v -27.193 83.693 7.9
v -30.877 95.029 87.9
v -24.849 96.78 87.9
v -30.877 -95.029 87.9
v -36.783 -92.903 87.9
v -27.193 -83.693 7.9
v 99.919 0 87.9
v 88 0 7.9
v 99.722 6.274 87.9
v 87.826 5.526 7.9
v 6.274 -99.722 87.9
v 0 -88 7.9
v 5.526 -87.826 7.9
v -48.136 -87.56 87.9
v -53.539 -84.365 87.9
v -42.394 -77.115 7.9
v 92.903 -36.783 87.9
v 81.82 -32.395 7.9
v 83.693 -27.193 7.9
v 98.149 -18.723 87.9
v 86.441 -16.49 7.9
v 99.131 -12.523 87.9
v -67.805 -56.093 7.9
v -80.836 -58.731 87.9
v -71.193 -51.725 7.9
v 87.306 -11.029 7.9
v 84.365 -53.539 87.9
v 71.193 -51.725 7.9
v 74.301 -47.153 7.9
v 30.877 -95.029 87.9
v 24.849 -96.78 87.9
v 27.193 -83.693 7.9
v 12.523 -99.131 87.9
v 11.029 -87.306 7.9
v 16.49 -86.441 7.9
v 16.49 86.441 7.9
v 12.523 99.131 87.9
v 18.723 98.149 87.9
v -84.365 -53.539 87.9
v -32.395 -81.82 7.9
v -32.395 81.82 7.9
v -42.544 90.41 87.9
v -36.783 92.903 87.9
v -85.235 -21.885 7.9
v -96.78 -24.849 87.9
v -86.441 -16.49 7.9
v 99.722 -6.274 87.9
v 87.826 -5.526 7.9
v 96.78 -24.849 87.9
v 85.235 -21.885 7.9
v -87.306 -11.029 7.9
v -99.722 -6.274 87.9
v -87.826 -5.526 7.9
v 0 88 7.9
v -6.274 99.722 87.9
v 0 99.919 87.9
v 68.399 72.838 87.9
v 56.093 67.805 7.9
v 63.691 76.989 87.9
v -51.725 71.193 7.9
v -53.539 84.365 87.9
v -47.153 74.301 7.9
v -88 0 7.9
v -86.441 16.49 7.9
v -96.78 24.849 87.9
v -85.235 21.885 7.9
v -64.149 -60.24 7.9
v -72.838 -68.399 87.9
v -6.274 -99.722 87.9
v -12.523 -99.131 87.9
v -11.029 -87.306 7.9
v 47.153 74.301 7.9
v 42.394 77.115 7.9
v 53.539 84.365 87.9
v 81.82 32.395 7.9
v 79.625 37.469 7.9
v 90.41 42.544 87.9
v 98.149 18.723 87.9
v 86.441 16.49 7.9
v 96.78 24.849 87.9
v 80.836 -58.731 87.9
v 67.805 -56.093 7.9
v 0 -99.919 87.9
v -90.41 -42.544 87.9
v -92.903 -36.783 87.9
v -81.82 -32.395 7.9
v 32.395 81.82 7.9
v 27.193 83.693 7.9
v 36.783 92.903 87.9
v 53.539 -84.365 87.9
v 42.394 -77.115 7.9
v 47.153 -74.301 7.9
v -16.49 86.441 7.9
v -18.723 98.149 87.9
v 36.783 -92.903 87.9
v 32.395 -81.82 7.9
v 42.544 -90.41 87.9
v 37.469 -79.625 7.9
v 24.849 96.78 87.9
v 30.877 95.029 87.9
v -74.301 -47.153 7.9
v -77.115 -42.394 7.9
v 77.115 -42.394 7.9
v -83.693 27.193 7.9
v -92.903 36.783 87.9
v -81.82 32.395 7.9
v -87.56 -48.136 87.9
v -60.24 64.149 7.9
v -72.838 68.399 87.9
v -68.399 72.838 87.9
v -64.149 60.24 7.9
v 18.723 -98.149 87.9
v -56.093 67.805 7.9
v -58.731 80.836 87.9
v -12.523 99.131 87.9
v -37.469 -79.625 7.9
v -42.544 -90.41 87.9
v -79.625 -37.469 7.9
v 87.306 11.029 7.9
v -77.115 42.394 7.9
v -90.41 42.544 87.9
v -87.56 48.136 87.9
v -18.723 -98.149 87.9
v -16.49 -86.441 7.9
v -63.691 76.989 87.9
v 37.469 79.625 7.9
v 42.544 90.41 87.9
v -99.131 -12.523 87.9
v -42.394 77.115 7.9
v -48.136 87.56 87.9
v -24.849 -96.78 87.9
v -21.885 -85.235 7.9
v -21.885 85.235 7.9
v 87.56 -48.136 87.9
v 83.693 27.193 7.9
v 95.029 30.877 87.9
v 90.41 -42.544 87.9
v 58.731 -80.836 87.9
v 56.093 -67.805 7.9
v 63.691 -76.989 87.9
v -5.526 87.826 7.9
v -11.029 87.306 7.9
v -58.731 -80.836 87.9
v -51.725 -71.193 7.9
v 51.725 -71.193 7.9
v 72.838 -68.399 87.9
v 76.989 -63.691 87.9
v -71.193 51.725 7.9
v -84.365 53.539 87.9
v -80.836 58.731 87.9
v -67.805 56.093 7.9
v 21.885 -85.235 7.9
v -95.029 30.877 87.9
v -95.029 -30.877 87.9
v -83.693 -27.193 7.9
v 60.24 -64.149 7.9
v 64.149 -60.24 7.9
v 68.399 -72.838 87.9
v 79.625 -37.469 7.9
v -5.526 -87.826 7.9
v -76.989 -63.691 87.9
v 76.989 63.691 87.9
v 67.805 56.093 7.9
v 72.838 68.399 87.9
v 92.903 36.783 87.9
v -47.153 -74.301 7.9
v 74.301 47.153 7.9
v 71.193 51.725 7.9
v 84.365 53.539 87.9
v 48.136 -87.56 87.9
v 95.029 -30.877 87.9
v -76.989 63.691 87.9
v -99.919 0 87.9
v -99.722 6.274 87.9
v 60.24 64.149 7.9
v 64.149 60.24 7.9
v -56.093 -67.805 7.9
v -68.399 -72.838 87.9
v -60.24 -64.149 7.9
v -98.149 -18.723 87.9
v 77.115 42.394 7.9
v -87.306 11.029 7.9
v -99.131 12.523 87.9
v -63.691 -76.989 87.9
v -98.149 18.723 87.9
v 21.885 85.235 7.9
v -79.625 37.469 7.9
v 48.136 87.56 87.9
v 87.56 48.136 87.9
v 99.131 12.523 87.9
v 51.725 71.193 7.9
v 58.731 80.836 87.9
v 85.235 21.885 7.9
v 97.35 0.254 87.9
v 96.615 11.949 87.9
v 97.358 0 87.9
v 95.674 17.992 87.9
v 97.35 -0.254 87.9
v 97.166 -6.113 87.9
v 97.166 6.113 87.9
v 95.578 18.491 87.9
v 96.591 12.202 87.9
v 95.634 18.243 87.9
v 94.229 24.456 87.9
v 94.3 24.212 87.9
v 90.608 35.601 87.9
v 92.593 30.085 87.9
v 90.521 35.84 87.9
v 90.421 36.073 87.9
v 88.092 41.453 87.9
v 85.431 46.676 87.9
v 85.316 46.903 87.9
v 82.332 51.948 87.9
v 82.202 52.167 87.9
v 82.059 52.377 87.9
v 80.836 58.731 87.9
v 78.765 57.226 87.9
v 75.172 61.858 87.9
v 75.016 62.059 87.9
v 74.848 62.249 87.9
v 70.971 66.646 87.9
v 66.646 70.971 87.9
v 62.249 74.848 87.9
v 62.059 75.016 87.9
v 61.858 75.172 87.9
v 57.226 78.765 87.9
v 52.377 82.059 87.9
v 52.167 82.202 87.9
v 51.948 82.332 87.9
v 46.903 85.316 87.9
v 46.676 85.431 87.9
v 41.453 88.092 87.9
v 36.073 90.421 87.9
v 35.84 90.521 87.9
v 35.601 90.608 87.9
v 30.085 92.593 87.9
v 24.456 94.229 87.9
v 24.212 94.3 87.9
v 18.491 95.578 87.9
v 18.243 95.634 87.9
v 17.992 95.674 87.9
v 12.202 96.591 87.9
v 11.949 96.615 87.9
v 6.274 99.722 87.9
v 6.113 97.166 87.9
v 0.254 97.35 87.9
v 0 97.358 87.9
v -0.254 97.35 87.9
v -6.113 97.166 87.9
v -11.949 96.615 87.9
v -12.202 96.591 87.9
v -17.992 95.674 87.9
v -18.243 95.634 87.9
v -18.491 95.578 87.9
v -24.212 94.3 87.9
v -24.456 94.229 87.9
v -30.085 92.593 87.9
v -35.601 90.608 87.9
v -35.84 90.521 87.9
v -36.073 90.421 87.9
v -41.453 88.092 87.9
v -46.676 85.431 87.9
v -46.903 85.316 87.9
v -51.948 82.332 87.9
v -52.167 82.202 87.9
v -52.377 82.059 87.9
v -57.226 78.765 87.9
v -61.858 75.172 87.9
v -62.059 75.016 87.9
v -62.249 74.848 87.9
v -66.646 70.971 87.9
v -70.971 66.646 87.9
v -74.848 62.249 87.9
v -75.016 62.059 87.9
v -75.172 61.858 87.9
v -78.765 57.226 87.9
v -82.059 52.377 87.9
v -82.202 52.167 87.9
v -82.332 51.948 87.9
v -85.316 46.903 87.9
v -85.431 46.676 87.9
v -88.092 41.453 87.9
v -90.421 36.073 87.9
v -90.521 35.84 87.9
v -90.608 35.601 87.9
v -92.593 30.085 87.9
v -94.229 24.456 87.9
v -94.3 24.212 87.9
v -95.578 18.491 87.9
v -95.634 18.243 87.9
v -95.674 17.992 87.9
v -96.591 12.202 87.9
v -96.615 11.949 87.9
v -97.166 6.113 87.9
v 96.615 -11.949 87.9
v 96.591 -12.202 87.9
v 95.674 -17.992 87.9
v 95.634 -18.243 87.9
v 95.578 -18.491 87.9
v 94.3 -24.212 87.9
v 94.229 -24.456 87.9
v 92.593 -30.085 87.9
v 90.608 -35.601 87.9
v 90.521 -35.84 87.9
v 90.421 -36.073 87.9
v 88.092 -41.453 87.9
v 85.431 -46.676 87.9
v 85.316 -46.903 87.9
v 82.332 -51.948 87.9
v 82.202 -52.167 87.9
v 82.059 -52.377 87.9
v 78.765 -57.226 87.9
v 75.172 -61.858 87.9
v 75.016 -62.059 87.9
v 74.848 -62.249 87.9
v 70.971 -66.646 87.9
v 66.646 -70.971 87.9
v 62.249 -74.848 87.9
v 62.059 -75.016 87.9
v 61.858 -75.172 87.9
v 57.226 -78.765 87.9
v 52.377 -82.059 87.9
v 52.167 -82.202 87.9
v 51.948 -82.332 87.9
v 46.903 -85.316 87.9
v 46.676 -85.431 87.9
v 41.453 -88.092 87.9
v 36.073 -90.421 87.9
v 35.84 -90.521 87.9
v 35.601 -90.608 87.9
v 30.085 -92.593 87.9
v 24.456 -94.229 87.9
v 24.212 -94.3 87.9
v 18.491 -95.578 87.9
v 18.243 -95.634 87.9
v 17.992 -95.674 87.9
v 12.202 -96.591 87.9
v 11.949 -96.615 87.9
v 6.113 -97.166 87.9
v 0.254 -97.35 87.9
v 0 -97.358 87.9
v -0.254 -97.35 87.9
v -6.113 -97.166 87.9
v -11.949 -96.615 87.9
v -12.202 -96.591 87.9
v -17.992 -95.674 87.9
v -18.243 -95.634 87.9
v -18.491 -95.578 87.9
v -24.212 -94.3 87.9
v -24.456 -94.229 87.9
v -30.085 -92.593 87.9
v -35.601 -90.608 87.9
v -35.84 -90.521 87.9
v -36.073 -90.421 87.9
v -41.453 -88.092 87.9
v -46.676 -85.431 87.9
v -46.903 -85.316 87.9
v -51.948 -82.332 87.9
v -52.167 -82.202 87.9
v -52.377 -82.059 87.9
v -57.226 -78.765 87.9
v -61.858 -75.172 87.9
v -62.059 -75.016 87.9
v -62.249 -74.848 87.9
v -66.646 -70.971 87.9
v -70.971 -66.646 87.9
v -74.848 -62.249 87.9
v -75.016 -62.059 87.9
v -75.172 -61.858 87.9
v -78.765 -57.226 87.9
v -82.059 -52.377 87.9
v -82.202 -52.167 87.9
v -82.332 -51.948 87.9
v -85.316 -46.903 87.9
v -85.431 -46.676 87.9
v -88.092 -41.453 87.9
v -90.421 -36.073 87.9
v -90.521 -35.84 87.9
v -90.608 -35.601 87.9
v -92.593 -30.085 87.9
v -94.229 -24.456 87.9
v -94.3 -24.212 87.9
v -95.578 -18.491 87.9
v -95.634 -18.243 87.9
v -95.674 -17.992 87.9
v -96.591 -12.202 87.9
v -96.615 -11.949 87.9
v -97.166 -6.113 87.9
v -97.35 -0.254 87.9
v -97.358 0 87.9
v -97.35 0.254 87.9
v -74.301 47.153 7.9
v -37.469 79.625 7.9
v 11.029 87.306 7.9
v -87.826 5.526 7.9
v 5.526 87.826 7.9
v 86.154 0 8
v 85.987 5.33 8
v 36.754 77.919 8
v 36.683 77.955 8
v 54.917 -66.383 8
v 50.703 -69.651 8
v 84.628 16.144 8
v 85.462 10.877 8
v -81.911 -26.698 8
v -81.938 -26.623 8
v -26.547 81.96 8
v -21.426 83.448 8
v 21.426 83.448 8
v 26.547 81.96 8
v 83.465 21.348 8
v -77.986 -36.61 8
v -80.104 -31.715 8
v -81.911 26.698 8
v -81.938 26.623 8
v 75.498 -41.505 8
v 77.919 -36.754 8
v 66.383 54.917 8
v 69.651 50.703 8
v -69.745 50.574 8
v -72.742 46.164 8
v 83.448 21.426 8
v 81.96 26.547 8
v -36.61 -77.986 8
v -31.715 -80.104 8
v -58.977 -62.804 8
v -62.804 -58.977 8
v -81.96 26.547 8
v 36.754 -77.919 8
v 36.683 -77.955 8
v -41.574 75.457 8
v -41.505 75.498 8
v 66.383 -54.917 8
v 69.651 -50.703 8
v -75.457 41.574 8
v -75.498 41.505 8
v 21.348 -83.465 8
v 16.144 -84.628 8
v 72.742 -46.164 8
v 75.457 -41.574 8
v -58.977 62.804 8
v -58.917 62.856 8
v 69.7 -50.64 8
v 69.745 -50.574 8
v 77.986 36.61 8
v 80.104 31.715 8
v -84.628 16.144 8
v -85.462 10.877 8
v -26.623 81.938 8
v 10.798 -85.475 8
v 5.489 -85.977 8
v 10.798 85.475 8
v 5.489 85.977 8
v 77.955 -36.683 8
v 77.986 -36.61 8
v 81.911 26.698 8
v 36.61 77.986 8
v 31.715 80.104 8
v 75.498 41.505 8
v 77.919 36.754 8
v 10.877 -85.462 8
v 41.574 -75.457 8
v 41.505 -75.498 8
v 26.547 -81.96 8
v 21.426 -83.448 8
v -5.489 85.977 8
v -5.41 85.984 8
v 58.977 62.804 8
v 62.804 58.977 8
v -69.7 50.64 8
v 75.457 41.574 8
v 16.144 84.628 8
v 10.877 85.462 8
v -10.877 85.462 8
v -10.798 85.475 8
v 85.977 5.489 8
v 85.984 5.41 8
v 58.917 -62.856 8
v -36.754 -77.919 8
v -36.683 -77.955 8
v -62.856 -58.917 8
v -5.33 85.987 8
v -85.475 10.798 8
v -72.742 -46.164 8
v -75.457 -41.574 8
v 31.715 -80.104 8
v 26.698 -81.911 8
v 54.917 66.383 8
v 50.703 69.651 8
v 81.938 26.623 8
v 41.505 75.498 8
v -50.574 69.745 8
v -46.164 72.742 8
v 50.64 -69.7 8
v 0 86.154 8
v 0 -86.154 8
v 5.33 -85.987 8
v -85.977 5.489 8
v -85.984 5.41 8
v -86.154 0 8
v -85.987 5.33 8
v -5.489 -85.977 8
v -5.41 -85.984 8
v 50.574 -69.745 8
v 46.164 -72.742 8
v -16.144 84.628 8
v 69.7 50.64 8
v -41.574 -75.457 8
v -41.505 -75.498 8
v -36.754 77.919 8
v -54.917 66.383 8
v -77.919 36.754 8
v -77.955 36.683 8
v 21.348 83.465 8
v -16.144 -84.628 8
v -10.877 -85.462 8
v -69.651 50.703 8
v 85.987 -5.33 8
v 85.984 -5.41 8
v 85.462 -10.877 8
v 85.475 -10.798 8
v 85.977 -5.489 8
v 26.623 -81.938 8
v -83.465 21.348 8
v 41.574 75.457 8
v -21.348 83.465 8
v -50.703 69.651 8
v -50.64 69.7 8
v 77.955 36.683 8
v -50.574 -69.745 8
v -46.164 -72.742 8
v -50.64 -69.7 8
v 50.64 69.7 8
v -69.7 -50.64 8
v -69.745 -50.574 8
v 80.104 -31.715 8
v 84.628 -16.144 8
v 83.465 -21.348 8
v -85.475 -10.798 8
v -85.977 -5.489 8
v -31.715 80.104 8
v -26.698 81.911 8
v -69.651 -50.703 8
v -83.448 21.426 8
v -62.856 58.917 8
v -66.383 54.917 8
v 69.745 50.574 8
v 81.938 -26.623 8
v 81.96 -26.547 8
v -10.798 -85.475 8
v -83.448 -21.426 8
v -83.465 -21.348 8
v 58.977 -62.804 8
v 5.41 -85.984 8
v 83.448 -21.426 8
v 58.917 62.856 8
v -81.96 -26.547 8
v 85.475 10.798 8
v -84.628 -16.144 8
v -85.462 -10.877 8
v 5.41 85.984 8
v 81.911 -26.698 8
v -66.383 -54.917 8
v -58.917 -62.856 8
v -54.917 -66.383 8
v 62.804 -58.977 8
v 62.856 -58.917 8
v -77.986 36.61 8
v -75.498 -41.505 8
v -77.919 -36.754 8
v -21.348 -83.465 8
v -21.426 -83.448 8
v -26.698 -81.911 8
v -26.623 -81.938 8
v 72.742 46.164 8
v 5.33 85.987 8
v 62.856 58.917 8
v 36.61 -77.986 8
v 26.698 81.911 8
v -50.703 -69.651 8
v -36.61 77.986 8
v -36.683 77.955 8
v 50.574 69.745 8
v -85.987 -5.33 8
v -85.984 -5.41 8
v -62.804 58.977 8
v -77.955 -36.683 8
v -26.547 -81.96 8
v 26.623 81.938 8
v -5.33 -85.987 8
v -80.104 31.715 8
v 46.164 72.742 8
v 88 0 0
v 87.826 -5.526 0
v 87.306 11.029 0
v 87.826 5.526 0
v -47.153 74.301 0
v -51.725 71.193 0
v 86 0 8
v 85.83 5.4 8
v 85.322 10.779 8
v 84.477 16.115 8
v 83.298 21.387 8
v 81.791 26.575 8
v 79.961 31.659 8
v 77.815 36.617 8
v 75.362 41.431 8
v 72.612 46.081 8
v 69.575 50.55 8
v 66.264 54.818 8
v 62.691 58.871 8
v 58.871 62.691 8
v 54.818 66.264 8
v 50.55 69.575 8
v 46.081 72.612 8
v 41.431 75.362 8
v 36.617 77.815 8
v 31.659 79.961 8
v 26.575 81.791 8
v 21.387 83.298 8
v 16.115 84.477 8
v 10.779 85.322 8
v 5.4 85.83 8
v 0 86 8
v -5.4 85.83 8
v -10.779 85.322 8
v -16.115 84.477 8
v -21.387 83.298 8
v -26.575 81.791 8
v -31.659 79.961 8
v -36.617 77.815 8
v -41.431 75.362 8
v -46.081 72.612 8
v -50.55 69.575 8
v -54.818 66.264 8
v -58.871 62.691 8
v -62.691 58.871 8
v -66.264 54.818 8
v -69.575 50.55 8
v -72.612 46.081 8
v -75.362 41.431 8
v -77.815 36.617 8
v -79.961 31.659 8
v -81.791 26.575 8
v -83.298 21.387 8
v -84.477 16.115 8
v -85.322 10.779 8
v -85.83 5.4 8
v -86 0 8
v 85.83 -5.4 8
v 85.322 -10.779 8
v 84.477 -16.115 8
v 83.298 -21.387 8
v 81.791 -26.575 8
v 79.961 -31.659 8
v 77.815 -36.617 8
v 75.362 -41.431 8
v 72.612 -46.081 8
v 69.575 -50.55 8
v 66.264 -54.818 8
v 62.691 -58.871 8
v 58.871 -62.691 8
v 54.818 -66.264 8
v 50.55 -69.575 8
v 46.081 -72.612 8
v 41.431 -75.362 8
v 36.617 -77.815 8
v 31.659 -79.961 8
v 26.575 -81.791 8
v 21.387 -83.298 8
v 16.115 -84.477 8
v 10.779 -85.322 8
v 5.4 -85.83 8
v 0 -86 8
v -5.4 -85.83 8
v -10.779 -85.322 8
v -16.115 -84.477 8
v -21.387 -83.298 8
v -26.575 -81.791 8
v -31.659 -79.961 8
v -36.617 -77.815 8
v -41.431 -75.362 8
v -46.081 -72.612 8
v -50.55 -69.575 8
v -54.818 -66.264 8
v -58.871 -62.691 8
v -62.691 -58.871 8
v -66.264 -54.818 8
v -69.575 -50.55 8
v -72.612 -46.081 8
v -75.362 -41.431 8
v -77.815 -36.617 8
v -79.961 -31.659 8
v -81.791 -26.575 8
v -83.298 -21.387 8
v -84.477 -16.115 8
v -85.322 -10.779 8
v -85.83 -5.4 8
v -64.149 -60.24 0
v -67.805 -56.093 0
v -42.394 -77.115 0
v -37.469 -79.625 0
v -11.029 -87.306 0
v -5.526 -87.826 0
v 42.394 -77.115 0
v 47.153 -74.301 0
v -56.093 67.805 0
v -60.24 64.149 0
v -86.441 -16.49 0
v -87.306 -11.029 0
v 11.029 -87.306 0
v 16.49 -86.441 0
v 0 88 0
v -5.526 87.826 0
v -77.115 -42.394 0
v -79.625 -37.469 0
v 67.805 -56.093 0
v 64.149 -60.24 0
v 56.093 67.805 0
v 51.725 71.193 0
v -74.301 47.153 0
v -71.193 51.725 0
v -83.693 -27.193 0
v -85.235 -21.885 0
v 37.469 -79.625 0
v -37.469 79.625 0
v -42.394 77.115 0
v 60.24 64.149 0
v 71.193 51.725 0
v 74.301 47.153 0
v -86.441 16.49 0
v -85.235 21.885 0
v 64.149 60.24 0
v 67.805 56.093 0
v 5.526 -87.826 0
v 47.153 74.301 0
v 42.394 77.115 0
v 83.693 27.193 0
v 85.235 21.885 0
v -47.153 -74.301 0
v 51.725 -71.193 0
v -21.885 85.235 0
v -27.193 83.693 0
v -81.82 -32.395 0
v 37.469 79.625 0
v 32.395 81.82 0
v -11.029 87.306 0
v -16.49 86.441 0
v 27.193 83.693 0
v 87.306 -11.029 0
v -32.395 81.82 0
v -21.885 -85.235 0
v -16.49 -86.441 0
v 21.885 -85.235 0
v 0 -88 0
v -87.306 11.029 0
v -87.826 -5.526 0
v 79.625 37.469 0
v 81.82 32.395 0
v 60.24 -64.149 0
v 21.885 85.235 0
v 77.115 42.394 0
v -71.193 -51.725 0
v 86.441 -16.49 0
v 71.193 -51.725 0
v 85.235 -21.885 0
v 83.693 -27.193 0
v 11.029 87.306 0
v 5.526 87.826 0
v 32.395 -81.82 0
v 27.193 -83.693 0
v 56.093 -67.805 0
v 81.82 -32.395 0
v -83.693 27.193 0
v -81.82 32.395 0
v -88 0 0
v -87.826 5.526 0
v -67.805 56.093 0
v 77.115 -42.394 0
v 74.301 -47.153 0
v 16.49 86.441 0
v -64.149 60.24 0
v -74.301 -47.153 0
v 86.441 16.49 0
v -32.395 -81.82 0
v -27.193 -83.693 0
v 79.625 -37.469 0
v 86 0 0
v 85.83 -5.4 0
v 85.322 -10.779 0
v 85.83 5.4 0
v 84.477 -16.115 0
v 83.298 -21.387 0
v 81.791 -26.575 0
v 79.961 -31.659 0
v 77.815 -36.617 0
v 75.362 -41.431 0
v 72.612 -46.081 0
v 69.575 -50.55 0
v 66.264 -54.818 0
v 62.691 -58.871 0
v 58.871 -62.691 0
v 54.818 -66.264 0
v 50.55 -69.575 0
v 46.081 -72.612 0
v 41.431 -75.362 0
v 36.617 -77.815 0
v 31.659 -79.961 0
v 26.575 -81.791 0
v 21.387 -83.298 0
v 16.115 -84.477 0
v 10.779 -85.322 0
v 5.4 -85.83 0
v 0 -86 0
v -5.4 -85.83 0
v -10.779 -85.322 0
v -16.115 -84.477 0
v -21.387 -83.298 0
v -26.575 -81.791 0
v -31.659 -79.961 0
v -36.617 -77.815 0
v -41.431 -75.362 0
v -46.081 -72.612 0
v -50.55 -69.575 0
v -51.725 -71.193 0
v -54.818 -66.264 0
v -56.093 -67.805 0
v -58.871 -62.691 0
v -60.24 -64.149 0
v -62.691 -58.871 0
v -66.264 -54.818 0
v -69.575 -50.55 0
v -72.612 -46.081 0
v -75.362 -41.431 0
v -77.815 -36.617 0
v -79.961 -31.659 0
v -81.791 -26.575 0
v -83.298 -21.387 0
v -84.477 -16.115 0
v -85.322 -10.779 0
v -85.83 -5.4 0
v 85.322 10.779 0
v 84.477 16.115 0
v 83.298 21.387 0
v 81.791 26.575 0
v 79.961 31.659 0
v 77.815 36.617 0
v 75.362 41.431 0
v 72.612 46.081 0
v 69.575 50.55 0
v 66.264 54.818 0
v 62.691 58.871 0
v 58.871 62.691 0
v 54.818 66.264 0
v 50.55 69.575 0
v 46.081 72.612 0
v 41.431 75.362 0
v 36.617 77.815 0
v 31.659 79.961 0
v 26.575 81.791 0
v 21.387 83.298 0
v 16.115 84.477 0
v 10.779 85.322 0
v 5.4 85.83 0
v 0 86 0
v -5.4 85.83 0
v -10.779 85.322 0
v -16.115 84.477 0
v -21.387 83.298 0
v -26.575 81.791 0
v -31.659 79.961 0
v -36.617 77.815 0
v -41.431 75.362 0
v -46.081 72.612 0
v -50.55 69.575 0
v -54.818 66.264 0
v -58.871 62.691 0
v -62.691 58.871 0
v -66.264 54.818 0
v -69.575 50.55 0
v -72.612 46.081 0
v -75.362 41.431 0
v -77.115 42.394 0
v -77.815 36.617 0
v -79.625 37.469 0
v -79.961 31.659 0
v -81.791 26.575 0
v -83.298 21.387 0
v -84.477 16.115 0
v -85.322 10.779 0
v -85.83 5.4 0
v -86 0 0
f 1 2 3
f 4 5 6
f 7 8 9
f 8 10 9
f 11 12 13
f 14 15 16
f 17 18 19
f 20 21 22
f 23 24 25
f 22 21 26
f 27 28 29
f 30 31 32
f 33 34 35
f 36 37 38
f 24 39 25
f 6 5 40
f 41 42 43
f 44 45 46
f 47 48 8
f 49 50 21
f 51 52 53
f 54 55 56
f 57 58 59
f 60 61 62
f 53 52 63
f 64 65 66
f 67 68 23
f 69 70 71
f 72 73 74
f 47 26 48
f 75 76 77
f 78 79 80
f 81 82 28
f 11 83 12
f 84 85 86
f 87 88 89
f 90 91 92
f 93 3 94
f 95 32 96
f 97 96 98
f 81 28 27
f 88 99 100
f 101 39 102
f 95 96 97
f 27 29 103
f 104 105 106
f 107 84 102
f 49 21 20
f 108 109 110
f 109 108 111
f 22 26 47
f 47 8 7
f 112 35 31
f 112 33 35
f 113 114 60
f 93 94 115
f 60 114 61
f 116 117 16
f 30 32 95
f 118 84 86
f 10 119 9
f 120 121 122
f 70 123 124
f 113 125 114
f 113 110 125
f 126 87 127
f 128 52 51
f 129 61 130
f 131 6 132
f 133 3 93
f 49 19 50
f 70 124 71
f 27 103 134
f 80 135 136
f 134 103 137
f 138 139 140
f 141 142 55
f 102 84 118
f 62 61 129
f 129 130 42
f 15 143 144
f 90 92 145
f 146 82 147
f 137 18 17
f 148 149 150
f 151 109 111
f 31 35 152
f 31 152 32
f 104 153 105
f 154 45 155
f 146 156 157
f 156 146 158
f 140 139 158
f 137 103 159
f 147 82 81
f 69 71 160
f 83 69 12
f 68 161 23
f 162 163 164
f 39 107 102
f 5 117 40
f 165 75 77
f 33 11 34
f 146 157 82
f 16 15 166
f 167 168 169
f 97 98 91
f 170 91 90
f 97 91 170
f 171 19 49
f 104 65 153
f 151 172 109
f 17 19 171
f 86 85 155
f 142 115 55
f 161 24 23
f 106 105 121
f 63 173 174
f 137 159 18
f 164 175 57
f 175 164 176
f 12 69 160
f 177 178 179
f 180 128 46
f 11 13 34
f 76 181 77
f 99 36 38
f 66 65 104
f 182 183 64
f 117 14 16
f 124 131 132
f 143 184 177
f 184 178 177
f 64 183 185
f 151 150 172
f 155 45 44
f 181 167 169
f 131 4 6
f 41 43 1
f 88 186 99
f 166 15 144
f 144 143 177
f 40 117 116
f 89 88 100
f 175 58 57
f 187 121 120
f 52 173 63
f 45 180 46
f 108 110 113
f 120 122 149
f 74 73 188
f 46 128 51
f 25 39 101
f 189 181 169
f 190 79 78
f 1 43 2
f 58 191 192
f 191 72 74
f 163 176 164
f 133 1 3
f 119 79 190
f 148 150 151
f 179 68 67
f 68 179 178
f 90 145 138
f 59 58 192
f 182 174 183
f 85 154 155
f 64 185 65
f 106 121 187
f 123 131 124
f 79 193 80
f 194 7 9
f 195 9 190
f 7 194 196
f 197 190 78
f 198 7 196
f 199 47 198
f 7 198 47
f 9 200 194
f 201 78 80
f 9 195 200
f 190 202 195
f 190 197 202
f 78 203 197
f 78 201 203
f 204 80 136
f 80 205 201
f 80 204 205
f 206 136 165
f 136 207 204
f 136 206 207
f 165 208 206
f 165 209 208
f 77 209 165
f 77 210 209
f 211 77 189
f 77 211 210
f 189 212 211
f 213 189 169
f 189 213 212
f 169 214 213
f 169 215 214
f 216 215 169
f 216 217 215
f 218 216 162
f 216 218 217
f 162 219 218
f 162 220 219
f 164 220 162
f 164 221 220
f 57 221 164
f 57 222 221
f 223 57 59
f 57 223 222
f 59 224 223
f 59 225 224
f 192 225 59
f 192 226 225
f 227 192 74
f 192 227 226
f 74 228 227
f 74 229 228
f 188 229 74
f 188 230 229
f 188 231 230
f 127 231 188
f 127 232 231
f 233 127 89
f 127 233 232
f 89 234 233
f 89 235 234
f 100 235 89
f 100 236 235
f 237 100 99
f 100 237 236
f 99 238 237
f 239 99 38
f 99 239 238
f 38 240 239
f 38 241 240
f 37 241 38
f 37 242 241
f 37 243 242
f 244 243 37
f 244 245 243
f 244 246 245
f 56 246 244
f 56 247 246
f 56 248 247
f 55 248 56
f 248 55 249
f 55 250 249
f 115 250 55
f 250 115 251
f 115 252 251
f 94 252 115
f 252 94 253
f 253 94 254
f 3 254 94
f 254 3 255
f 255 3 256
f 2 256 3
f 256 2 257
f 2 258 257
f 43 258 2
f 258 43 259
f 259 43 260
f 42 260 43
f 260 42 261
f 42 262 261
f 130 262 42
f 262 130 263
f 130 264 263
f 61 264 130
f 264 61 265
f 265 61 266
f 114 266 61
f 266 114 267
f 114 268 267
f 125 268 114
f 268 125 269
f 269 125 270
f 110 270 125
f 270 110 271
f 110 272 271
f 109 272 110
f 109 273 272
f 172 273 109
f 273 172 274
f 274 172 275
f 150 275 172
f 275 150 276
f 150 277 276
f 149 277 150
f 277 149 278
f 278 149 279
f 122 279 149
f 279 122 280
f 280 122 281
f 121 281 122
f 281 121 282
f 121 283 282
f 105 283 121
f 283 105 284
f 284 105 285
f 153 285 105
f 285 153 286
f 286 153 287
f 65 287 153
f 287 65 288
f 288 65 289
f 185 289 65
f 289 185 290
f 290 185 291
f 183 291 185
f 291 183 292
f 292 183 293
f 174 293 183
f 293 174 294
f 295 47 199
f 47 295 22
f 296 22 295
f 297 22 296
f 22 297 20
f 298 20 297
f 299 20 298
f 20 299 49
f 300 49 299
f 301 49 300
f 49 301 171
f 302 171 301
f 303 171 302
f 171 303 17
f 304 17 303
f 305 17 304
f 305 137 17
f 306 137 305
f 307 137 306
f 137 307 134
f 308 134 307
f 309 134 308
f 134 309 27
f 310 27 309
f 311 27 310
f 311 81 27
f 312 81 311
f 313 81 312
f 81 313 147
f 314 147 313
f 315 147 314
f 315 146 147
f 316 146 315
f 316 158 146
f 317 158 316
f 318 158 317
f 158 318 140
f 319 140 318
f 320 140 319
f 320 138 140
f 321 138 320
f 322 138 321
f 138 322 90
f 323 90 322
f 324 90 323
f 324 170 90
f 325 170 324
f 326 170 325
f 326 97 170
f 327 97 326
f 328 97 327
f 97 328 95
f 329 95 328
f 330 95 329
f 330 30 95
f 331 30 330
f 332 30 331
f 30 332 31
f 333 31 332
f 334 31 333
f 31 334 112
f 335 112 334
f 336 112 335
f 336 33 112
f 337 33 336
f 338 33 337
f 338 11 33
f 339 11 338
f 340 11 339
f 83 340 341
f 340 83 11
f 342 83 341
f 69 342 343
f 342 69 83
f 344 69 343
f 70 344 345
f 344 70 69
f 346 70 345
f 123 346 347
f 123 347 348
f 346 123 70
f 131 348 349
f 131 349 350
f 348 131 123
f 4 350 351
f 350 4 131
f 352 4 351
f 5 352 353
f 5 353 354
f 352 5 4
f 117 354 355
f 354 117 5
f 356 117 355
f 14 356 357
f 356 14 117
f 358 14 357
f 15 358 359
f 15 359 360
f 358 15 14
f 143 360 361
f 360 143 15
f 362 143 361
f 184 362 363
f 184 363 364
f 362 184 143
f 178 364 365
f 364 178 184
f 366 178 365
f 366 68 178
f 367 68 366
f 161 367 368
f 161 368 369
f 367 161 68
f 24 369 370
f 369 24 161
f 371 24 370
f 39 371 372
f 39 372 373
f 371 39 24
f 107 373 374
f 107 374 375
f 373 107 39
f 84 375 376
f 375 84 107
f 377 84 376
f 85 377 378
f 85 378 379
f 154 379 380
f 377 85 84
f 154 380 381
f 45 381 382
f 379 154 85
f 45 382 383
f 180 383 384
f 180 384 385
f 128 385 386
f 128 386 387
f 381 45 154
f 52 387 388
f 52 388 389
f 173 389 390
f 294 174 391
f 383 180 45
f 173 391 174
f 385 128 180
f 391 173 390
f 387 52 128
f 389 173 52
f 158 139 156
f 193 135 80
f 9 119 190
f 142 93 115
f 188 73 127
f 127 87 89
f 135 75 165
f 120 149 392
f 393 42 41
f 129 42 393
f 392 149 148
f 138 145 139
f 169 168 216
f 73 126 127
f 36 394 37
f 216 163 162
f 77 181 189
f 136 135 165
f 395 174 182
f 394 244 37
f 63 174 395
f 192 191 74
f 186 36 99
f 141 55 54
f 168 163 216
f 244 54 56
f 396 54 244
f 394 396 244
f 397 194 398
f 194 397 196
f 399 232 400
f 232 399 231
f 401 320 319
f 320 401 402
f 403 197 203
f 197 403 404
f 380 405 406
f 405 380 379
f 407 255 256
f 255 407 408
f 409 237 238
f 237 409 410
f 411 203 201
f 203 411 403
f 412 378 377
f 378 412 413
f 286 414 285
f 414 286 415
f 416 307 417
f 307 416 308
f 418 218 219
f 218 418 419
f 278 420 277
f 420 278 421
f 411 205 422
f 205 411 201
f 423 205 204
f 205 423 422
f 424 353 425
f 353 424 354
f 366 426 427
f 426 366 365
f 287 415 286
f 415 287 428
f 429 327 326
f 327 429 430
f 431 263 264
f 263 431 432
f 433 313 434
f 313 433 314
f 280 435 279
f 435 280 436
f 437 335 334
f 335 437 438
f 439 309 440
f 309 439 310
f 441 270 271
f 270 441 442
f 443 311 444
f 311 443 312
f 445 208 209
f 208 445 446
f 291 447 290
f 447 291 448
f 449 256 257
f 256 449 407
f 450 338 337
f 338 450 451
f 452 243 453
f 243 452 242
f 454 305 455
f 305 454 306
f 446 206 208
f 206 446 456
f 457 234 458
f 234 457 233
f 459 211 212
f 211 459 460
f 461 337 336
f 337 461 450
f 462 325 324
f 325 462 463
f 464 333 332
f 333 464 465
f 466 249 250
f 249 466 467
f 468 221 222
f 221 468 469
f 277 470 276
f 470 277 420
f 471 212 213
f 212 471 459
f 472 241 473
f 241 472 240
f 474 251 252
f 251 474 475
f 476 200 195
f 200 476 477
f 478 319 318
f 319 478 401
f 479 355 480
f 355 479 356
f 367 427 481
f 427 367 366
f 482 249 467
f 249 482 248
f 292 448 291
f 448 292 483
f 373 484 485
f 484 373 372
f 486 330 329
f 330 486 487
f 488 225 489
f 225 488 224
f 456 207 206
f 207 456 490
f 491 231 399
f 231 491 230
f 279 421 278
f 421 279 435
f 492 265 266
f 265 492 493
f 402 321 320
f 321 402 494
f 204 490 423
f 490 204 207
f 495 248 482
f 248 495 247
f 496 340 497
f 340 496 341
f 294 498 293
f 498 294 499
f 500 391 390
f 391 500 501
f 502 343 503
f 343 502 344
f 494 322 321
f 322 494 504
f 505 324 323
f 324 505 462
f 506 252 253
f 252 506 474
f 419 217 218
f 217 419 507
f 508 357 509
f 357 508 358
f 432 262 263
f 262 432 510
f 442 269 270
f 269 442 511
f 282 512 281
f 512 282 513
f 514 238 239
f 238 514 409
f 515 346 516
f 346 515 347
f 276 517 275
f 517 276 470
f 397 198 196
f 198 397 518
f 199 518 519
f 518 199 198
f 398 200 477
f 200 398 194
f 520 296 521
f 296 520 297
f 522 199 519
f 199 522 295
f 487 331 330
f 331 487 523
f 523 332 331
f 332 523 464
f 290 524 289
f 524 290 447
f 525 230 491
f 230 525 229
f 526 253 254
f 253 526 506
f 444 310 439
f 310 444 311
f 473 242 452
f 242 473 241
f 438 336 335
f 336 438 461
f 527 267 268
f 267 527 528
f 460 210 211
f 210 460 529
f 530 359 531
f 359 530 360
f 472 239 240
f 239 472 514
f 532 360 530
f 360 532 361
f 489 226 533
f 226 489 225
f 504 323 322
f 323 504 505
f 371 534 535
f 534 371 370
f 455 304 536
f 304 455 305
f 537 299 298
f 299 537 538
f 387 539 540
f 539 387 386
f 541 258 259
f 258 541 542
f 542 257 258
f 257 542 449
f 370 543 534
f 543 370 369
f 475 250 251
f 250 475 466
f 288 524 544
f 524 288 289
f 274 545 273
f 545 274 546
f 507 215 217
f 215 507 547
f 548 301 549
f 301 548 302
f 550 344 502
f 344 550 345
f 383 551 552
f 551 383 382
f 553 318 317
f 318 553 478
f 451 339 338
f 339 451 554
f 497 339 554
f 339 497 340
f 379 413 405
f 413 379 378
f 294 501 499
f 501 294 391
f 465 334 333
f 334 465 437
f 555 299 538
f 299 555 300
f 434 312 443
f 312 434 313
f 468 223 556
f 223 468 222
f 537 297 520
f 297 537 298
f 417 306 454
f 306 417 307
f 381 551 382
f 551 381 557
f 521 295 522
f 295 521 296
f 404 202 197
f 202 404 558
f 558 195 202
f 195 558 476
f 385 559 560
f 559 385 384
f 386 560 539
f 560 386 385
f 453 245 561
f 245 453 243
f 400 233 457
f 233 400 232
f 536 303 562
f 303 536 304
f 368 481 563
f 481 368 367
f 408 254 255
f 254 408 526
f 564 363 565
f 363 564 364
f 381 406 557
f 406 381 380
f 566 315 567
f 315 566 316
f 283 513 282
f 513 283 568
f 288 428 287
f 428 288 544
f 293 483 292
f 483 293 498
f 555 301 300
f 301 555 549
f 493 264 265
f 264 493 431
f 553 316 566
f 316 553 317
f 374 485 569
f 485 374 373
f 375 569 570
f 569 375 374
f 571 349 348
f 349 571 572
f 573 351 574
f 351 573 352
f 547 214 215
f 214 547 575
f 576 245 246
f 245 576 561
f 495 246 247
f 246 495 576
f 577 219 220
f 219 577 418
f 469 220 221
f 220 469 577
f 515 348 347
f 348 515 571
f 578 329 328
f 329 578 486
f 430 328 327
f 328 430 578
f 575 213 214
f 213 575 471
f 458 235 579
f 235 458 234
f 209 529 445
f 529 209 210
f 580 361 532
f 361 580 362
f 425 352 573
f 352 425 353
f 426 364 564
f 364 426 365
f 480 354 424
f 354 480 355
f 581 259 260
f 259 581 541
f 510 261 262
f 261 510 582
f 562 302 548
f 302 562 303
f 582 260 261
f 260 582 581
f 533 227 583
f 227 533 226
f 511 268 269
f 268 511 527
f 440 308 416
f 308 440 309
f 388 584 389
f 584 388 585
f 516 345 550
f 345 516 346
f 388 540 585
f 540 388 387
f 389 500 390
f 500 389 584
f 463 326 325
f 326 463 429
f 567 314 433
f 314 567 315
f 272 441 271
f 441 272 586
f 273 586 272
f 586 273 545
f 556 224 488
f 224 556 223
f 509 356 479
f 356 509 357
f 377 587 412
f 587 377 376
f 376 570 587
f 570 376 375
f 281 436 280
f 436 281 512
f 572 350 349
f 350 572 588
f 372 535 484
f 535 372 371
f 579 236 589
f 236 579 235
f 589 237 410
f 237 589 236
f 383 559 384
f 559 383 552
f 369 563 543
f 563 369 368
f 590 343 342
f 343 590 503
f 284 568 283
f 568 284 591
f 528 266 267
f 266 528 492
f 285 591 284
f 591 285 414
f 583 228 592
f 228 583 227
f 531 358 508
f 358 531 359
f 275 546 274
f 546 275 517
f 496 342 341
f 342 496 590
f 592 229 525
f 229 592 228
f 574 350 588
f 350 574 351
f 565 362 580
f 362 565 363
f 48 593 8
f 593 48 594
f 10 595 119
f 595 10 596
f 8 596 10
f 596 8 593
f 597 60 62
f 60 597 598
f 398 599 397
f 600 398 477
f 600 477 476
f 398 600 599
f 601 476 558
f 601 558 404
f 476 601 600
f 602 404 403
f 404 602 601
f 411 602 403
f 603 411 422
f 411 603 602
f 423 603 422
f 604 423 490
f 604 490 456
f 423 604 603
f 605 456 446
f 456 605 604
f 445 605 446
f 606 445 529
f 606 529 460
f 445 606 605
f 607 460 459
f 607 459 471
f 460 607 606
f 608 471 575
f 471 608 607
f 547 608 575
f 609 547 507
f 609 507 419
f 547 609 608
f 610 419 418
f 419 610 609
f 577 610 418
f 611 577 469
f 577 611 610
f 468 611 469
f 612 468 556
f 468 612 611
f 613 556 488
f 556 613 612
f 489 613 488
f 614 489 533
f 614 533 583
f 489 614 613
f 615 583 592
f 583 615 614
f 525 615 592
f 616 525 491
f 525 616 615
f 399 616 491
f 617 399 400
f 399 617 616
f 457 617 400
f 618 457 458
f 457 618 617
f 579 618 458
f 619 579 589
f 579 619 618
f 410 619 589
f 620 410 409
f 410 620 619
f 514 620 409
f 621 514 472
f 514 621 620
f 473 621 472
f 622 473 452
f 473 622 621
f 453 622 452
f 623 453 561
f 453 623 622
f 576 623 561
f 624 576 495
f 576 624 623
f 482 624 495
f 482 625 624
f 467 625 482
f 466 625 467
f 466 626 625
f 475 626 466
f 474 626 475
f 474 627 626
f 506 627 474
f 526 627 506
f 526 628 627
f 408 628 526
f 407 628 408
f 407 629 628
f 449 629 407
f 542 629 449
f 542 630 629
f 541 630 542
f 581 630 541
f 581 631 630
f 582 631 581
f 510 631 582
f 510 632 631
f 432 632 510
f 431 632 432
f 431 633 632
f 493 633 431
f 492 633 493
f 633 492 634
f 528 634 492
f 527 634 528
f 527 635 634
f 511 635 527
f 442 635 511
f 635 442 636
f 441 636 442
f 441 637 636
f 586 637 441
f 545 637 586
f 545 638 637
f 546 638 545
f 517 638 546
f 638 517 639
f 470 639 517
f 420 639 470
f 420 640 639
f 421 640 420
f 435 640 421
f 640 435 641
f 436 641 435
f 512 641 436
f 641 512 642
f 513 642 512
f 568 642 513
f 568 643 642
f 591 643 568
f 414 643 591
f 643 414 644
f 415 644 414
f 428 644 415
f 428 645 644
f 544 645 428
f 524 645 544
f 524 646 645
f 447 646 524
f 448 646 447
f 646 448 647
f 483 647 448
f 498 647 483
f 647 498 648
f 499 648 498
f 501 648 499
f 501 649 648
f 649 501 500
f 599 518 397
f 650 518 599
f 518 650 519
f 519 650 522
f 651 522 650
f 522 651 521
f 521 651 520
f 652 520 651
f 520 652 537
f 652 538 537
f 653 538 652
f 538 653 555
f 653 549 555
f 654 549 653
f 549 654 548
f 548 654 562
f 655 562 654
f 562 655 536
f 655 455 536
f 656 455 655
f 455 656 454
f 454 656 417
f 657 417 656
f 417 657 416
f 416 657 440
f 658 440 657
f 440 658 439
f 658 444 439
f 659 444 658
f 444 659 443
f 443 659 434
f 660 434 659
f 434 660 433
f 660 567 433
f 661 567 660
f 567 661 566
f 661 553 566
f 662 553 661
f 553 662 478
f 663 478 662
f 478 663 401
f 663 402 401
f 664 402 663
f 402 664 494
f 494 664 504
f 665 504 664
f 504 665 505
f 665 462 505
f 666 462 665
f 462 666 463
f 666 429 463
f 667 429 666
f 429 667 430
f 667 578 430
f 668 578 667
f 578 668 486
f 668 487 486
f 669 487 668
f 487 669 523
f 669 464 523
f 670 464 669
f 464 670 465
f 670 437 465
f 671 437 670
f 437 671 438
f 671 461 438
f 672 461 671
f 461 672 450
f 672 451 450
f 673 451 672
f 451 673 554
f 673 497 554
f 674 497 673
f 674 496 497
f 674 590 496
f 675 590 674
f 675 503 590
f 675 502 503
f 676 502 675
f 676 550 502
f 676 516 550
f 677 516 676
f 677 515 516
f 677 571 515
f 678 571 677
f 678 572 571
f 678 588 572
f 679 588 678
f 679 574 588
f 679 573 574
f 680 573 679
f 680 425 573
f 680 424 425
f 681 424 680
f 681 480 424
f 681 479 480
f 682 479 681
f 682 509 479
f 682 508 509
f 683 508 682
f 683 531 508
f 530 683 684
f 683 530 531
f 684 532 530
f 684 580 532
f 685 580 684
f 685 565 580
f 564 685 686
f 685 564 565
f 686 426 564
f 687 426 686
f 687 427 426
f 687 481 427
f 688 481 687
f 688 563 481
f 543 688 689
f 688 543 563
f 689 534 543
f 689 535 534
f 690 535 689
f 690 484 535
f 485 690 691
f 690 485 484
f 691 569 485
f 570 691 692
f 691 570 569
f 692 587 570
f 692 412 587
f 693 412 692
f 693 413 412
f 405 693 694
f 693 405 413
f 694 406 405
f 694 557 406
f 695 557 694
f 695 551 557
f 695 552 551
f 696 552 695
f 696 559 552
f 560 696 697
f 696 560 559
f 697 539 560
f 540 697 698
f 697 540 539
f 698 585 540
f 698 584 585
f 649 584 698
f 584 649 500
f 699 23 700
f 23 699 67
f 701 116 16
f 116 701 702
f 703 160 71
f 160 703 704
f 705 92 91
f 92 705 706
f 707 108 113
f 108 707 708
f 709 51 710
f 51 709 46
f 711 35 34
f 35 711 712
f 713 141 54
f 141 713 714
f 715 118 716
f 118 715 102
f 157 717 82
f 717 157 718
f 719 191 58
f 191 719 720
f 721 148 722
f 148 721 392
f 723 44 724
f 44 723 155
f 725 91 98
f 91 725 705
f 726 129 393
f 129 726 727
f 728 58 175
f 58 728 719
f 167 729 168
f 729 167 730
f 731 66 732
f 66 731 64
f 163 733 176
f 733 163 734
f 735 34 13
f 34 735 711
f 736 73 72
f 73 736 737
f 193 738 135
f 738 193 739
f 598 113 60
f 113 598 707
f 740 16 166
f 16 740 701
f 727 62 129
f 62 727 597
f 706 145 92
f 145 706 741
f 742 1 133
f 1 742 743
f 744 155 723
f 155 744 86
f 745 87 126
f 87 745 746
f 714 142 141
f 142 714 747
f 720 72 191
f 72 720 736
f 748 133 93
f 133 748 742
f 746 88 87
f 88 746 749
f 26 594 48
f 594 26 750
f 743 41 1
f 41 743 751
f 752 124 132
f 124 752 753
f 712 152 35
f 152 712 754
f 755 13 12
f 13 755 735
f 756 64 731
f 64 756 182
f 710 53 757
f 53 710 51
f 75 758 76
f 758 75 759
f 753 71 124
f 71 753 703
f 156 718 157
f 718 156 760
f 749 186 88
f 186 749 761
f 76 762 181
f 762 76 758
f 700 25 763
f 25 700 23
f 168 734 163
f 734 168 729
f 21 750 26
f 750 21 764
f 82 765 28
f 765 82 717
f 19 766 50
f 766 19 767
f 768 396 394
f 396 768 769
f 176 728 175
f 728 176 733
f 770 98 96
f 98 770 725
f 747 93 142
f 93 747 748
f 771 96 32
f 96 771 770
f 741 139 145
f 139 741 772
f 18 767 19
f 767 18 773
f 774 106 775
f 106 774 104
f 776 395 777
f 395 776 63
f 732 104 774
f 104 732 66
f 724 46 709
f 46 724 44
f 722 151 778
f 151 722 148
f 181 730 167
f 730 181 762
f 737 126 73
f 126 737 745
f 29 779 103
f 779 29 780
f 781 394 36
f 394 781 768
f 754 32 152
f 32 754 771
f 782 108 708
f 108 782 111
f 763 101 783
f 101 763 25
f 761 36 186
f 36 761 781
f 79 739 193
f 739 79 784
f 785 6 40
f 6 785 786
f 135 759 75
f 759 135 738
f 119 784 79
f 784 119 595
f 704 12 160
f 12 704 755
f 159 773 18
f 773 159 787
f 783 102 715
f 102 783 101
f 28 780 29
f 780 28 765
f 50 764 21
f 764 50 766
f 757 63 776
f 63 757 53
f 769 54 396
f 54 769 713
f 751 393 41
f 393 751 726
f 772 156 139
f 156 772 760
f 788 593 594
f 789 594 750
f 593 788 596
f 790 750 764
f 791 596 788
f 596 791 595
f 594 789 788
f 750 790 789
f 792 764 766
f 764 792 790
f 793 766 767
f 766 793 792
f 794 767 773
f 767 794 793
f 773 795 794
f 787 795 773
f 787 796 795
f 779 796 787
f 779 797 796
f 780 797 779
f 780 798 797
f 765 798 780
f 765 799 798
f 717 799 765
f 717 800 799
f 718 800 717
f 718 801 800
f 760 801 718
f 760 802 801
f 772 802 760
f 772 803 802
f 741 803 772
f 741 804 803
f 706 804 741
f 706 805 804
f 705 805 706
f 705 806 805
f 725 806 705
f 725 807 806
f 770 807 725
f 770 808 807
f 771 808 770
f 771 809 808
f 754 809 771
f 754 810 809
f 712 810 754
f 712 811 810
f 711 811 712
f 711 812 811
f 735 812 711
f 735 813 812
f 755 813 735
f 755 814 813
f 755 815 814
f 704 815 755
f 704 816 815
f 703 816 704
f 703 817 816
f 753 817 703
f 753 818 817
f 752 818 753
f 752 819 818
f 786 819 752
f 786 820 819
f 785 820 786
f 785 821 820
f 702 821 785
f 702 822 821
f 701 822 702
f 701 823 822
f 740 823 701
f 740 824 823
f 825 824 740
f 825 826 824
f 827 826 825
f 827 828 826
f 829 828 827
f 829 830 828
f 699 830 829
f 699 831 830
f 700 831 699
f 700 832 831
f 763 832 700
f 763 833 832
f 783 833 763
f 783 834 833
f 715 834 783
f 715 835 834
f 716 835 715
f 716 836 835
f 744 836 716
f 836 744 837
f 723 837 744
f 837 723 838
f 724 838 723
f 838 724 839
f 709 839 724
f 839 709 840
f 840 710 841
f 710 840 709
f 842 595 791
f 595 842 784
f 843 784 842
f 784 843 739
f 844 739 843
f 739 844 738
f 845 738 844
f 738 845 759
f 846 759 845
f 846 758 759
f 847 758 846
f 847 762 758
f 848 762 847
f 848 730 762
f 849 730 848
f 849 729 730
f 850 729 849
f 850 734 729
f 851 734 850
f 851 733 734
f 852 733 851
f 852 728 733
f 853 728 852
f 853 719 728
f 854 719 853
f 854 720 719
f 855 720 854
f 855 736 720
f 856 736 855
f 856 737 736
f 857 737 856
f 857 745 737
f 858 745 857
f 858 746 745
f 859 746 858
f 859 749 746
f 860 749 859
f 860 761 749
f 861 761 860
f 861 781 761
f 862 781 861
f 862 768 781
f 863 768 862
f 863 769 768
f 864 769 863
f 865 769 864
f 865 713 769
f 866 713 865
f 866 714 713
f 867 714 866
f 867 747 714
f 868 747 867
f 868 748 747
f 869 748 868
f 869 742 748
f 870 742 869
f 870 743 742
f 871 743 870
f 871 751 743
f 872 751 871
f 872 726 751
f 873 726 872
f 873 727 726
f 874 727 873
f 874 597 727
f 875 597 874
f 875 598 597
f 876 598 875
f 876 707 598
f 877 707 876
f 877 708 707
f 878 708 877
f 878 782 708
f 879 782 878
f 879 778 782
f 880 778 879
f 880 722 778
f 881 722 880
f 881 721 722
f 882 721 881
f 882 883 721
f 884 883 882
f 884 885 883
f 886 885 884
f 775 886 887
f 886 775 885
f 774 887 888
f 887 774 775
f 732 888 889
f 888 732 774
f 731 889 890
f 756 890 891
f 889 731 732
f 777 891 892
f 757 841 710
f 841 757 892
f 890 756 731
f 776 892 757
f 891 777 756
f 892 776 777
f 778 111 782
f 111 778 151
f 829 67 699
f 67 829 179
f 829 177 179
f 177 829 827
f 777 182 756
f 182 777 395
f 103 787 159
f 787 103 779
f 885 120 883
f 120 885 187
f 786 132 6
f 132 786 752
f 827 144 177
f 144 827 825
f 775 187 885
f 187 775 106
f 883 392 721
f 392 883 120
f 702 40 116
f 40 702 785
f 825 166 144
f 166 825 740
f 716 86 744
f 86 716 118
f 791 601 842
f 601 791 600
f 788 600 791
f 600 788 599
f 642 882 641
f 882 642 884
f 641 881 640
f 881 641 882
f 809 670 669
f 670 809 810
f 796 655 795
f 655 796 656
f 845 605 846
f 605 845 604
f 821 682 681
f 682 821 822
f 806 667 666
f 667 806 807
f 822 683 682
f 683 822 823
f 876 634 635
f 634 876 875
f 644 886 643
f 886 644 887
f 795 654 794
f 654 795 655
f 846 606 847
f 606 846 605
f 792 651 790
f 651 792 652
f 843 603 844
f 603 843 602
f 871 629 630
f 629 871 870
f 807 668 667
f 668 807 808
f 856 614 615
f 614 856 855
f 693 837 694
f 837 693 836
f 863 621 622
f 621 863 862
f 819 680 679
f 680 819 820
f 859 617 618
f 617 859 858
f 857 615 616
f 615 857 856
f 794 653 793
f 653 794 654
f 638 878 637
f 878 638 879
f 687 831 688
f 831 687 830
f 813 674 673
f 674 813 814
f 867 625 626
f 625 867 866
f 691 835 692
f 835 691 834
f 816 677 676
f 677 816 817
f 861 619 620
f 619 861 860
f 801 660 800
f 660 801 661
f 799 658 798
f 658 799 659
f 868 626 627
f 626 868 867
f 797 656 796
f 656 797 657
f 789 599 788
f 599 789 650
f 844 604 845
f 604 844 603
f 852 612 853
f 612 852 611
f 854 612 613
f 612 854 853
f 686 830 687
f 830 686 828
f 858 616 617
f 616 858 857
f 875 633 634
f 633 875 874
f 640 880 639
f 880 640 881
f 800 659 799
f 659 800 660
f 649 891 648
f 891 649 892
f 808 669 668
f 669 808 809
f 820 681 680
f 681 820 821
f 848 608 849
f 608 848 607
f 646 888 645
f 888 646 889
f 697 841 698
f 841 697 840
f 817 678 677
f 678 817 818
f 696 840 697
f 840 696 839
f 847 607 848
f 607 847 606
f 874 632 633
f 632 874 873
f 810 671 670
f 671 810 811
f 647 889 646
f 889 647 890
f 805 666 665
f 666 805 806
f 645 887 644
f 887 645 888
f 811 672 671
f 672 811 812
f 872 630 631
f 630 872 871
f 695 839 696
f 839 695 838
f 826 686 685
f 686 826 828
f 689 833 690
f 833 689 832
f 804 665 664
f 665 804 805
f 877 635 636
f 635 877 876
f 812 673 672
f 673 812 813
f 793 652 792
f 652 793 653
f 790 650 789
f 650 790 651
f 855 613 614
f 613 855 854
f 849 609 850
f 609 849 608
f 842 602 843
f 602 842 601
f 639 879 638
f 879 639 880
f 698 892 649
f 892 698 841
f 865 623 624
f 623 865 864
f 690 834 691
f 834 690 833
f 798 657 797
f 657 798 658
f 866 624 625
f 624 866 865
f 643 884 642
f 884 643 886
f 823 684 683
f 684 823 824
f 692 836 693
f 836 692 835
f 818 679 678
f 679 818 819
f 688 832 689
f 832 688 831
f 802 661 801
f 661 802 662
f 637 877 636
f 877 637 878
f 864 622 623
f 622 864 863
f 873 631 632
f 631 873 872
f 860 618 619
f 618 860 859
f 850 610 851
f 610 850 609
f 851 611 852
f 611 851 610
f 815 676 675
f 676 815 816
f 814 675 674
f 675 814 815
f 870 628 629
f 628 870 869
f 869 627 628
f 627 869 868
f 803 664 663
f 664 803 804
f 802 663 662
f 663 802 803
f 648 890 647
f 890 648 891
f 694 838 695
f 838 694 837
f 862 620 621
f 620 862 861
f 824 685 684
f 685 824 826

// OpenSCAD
// =============================================================
// 3D-PAWS Rain Gauge - Calibrated Rim
// =============================================================
//
// PURPOSE:
//   This file generates the calibrated rim for the tipping bucket
//   rain gauge. The rim diameter is calculated during the calibration
//   process to ensure the gauge tips at exactly 0.2mm of rain.
//
// HOW TO USE THIS FILE:
//   1. Complete the calibration procedure as described in the manual.
//   2. Use the "Rim Radius Calculation" spreadsheet to determine
//      the correct radius value from your calibration data.
//   3. Update ONLY the 'radius' variable below with your calculated value.
//   4. Export as STL: File > Export > Export as STL.
//
// *** DO NOT change any other values in this file. ***
// =============================================================


// --- SMOOTHNESS SETTING (do not change) ---
$fn = 100;

// --- CALIBRATED RADIUS (mm) ---
// *** UPDATE THIS VALUE ONLY ***
// Replace the number below with the radius calculated from your
// calibration spreadsheet (e.g. the manual example gives 99.19852).
// Copy the value to at least 2 decimal places for accuracy.
radius = 97.91923434;


// --- RIM GEOMETRY (DO NOT CHANGE BELOW THIS LINE) ---

// Outer funnel cone: tapers outward from the base to the calibrated radius
translate([0, 0, 7.9])
difference() {
    cylinder(80, 88, radius + 2);          // outer wall of funnel cone
    translate([0, 0, -1]) cylinder(85, 86, radius); // inner cutout
}

// Base rim ring: the fixed-diameter collar that sits on the gauge body
difference() {
    cylinder(8, 88, 88);                   // outer rim cylinder
    translate([0, 0, -5]) cylinder(120, 86, 86); // inner cutout
}
